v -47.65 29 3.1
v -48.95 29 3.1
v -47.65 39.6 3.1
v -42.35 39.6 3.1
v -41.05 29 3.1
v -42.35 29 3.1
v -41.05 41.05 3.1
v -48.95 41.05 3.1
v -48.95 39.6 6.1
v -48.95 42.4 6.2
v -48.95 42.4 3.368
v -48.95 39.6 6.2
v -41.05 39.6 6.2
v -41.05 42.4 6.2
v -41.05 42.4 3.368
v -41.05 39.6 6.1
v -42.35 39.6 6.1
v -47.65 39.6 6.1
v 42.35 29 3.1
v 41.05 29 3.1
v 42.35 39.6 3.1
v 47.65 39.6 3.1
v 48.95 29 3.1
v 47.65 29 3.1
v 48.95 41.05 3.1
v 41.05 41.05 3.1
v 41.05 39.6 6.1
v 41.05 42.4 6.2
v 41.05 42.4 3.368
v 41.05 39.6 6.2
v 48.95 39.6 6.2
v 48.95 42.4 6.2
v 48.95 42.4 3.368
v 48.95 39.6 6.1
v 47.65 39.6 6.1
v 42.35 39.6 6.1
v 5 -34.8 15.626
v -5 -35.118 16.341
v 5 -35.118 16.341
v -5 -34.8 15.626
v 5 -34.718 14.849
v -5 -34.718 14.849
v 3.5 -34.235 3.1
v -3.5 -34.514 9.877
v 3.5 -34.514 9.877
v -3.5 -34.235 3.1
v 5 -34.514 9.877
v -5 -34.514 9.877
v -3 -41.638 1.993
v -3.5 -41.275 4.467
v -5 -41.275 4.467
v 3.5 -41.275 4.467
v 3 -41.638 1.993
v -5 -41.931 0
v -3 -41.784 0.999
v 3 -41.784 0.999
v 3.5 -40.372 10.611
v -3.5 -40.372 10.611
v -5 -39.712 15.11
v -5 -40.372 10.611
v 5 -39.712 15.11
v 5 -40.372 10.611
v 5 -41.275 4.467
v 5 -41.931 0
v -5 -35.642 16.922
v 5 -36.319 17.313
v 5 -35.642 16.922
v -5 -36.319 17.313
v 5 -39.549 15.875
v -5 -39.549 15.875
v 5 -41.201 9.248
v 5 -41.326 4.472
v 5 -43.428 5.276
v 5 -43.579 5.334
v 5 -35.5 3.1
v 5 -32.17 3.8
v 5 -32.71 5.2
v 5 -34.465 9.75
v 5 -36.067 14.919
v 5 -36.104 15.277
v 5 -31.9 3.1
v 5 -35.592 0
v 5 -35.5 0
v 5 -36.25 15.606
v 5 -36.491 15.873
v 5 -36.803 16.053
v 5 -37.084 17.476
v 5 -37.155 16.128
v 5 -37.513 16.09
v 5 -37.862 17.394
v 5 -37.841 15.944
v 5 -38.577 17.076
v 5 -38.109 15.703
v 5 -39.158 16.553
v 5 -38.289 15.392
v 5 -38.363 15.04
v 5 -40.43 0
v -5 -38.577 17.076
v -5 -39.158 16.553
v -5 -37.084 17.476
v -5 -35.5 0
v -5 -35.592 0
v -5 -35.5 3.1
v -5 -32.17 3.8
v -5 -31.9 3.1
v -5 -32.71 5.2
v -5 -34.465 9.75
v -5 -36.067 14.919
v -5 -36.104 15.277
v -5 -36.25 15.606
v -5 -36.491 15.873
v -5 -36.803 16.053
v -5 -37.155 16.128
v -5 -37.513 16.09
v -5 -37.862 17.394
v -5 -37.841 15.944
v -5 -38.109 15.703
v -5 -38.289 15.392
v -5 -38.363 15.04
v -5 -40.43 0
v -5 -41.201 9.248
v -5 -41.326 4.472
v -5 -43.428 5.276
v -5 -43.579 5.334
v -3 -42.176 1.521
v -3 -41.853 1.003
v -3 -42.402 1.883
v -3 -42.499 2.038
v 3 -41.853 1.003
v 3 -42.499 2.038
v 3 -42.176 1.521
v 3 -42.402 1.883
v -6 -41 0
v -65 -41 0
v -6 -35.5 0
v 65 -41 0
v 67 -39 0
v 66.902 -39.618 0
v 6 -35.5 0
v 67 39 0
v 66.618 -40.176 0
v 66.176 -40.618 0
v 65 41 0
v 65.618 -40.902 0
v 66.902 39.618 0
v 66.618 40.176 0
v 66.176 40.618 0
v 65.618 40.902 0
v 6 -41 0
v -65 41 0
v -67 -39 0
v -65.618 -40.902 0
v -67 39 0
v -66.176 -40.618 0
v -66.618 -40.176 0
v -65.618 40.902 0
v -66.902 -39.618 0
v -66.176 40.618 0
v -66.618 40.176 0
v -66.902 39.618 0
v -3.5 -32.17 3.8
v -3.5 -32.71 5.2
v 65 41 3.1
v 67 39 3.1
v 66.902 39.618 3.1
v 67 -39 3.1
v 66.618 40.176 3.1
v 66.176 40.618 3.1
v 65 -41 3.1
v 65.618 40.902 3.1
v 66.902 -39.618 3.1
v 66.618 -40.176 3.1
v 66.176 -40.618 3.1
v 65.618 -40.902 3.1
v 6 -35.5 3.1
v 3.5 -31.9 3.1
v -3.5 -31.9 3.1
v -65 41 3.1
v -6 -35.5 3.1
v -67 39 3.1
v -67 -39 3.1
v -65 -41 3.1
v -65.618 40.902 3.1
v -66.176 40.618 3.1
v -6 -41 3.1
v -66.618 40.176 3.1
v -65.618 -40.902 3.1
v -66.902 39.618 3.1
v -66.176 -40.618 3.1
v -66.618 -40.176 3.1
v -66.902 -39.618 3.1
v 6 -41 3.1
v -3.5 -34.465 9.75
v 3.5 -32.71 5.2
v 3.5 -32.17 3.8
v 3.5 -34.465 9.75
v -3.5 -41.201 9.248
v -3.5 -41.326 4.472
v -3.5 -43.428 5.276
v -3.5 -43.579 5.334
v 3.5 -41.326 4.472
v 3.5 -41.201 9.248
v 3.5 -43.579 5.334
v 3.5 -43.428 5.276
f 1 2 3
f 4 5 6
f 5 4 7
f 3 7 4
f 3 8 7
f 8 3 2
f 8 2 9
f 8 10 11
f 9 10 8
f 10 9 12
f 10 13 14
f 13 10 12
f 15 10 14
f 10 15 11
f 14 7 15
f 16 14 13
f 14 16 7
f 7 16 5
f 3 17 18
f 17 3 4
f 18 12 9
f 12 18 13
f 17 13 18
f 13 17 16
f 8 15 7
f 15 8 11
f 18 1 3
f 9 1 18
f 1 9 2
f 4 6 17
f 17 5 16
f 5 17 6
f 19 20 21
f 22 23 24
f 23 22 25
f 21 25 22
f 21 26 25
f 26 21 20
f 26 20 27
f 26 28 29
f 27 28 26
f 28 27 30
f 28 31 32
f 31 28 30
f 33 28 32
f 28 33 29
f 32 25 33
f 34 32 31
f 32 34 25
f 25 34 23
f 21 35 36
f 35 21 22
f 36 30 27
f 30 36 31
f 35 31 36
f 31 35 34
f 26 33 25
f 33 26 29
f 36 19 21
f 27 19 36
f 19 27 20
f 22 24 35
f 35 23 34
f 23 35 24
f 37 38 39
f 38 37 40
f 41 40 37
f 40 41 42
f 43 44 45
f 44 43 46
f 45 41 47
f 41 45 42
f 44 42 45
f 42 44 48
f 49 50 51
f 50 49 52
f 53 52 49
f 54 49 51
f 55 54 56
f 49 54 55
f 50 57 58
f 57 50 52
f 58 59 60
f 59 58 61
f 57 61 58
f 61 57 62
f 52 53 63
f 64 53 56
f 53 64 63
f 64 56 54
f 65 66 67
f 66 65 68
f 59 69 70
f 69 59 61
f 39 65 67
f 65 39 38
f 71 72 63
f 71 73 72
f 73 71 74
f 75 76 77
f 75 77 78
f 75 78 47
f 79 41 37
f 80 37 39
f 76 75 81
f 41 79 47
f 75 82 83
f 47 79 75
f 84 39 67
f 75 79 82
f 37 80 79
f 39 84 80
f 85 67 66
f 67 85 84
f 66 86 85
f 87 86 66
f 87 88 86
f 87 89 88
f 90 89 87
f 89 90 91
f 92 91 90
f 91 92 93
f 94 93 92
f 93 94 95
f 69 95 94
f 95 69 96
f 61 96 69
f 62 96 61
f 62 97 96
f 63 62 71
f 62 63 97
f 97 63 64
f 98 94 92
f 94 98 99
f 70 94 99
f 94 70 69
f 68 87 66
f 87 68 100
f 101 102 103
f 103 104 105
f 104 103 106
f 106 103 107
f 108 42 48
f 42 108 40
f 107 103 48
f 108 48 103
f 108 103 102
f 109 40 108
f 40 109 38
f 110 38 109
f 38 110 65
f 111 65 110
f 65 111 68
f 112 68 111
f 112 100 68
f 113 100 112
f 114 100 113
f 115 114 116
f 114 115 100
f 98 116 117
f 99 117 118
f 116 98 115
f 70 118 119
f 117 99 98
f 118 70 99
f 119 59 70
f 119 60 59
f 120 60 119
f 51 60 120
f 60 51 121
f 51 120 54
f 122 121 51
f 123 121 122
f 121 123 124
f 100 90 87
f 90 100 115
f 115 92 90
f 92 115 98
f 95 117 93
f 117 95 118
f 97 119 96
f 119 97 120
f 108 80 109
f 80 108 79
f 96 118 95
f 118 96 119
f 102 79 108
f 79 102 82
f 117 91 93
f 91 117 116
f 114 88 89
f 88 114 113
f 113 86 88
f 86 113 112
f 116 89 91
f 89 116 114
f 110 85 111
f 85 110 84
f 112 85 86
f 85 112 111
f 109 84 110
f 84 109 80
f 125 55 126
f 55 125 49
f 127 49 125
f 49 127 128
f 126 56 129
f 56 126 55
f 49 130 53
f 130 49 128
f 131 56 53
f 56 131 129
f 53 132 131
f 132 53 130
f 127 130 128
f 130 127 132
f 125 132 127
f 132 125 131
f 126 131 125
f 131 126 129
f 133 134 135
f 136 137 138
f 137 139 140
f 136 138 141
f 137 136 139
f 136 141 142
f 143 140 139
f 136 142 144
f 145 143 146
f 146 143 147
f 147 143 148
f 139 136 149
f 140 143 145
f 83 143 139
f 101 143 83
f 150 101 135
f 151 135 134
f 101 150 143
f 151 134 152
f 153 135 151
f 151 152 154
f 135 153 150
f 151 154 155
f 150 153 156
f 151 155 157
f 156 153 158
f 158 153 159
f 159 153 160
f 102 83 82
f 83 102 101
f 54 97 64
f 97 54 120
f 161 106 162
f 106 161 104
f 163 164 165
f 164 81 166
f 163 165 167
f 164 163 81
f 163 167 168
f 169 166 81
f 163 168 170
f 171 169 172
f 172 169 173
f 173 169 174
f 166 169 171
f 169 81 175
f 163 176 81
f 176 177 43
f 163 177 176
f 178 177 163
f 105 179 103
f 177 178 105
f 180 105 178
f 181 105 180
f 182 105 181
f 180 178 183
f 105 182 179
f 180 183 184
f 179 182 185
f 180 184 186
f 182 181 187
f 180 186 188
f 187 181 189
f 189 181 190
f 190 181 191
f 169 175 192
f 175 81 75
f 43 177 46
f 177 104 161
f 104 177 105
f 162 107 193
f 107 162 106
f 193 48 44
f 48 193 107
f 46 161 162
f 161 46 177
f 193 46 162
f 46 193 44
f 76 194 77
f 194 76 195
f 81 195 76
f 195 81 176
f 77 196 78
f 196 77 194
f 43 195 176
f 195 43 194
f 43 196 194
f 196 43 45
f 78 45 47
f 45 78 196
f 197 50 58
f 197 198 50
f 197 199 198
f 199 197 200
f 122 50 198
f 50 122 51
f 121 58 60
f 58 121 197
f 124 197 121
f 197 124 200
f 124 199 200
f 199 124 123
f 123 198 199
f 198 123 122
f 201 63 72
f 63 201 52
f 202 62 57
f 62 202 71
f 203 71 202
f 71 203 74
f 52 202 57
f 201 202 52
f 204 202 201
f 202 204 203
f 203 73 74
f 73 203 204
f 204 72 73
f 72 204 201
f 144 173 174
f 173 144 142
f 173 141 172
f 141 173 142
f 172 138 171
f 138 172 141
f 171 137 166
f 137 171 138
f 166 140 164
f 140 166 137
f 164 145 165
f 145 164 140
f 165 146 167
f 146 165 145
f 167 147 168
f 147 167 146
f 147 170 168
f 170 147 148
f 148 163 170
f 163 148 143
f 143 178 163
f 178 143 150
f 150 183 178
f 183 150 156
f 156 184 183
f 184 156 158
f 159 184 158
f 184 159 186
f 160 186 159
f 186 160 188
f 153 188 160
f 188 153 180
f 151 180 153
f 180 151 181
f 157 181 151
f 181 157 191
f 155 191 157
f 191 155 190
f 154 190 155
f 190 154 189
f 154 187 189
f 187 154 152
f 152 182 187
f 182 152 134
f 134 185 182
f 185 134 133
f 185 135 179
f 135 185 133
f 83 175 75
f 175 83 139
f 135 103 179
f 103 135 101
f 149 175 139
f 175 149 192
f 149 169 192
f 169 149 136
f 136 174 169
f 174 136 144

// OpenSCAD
// Cable and Battery Doors for Thomson/Pathé Marconi/… EL 1466 M
// Copyright 2026, François Revol

// References (for model name):
// https://www.doctsf.com/hifivox-el-1466-m/f41787
// https://electrovintage.com/products/electrophone-pathe-marconi-el1466

/* [Variant] */

variant = 0; // [0:Cable Door,1:Battery Door]

/* [Printing] */

optimize_fdm = true;

/* [Preview] */

preview_color = "OrangeRed"; // [White,OrangeRed:Orange - use ColorFabb Vermillon RAL 2002 ]

/* [Hidden] */

r1 = 2;

plate_bbox = variant ? [109.5,134.3,3.1] : [134, 82, 3.1];

hinges = variant ? [[19-plate_bbox.x/2,4],[plate_bbox.x/2-33,12]] : [[22-plate_bbox.x/2,12],[plate_bbox.x/2-22,12]];

$fn = 20;

module hinge(l) {
    // actually a slope, but well
    b = [7.9,2.8];
    difference() {
        linear_extrude(3.1) square(b, center=true);
        if (optimize_fdm)
            translate([0,b.y,-0.01]) linear_extrude(0.5, scale=[1,0.1]) translate([0,-b.y/2]) square(b+[1,0], center=true);
    }
    for (dx=[-1,1])
        translate([dx*(b.x-1.3)/2,0]) linear_extrude(3, scale=[1,2.8/(2*l)]) translate([0,-l/2]) square([1.3,l], center=true);
}

module clip() {
    difference() {
        rotate([-3,0,0]) {
            difference() {
                hull() {
                    translate([0,0,15]) rotate([0,90,0]) cylinder(d=5, h=10, center=true);
                    translate([0,0,-1]) rotate([0,90,0]) cylinder(d=8, h=10, center=true);
                }
                hull() {
                    translate([0,0,15]) rotate([0,90,0]) cylinder(d=optimize_fdm?2.3:2.7, h=20, center=true);
                    translate([0,0,-1]) rotate([0,90,0]) cylinder(d=5, h=20, center=true);
                }
            }
            // approximation
            translate([0,-3.8,0.8]) linear_extrude(1, scale=[1,8]) square([6,0.2], center=true);
        }
        rotate(optimize_fdm ? [0,0,0] : [5,0,0]) translate([0,0,-10]) cube([20,20,20], center=true);
    }
    for(dx=[-1,1]) translate([dx*(10-1.5)/2,3.4,plate_bbox.z]) linear_extrude(7, scale=[1,0]) translate([0,2.7/2,0]) square([1.5,2.7], center=true);
    // approximation
    for(dx=[-1,1]) rotate([-6,0,0]) translate([dx*(10-1.5)/2,-3.4,plate_bbox.z+1]) difference() {
        linear_extrude(6.35, scale=[1,0]) translate([0,-3/2,0]) square([1.5,3], center=true);
        if (optimize_fdm) {
            translate([0,-3,-0.1]) linear_extrude(0.8, scale=[1,0]) translate([0,1.5]) square([1.7,3], center=true);
        }
    }
}

color(preview_color) {
    linear_extrude(plate_bbox.z) difference() {
        offset(r1) offset(-r1) square([plate_bbox.x,plate_bbox.y], center=true);
        translate([0,-plate_bbox.y/2]) square([12,11], center=true);
    }
    for (h = hinges) translate([h.x,plate_bbox.y/2,plate_bbox.z]) hinge(h.y);
    translate([0,3-plate_bbox.y/2,0]) clip();
}
